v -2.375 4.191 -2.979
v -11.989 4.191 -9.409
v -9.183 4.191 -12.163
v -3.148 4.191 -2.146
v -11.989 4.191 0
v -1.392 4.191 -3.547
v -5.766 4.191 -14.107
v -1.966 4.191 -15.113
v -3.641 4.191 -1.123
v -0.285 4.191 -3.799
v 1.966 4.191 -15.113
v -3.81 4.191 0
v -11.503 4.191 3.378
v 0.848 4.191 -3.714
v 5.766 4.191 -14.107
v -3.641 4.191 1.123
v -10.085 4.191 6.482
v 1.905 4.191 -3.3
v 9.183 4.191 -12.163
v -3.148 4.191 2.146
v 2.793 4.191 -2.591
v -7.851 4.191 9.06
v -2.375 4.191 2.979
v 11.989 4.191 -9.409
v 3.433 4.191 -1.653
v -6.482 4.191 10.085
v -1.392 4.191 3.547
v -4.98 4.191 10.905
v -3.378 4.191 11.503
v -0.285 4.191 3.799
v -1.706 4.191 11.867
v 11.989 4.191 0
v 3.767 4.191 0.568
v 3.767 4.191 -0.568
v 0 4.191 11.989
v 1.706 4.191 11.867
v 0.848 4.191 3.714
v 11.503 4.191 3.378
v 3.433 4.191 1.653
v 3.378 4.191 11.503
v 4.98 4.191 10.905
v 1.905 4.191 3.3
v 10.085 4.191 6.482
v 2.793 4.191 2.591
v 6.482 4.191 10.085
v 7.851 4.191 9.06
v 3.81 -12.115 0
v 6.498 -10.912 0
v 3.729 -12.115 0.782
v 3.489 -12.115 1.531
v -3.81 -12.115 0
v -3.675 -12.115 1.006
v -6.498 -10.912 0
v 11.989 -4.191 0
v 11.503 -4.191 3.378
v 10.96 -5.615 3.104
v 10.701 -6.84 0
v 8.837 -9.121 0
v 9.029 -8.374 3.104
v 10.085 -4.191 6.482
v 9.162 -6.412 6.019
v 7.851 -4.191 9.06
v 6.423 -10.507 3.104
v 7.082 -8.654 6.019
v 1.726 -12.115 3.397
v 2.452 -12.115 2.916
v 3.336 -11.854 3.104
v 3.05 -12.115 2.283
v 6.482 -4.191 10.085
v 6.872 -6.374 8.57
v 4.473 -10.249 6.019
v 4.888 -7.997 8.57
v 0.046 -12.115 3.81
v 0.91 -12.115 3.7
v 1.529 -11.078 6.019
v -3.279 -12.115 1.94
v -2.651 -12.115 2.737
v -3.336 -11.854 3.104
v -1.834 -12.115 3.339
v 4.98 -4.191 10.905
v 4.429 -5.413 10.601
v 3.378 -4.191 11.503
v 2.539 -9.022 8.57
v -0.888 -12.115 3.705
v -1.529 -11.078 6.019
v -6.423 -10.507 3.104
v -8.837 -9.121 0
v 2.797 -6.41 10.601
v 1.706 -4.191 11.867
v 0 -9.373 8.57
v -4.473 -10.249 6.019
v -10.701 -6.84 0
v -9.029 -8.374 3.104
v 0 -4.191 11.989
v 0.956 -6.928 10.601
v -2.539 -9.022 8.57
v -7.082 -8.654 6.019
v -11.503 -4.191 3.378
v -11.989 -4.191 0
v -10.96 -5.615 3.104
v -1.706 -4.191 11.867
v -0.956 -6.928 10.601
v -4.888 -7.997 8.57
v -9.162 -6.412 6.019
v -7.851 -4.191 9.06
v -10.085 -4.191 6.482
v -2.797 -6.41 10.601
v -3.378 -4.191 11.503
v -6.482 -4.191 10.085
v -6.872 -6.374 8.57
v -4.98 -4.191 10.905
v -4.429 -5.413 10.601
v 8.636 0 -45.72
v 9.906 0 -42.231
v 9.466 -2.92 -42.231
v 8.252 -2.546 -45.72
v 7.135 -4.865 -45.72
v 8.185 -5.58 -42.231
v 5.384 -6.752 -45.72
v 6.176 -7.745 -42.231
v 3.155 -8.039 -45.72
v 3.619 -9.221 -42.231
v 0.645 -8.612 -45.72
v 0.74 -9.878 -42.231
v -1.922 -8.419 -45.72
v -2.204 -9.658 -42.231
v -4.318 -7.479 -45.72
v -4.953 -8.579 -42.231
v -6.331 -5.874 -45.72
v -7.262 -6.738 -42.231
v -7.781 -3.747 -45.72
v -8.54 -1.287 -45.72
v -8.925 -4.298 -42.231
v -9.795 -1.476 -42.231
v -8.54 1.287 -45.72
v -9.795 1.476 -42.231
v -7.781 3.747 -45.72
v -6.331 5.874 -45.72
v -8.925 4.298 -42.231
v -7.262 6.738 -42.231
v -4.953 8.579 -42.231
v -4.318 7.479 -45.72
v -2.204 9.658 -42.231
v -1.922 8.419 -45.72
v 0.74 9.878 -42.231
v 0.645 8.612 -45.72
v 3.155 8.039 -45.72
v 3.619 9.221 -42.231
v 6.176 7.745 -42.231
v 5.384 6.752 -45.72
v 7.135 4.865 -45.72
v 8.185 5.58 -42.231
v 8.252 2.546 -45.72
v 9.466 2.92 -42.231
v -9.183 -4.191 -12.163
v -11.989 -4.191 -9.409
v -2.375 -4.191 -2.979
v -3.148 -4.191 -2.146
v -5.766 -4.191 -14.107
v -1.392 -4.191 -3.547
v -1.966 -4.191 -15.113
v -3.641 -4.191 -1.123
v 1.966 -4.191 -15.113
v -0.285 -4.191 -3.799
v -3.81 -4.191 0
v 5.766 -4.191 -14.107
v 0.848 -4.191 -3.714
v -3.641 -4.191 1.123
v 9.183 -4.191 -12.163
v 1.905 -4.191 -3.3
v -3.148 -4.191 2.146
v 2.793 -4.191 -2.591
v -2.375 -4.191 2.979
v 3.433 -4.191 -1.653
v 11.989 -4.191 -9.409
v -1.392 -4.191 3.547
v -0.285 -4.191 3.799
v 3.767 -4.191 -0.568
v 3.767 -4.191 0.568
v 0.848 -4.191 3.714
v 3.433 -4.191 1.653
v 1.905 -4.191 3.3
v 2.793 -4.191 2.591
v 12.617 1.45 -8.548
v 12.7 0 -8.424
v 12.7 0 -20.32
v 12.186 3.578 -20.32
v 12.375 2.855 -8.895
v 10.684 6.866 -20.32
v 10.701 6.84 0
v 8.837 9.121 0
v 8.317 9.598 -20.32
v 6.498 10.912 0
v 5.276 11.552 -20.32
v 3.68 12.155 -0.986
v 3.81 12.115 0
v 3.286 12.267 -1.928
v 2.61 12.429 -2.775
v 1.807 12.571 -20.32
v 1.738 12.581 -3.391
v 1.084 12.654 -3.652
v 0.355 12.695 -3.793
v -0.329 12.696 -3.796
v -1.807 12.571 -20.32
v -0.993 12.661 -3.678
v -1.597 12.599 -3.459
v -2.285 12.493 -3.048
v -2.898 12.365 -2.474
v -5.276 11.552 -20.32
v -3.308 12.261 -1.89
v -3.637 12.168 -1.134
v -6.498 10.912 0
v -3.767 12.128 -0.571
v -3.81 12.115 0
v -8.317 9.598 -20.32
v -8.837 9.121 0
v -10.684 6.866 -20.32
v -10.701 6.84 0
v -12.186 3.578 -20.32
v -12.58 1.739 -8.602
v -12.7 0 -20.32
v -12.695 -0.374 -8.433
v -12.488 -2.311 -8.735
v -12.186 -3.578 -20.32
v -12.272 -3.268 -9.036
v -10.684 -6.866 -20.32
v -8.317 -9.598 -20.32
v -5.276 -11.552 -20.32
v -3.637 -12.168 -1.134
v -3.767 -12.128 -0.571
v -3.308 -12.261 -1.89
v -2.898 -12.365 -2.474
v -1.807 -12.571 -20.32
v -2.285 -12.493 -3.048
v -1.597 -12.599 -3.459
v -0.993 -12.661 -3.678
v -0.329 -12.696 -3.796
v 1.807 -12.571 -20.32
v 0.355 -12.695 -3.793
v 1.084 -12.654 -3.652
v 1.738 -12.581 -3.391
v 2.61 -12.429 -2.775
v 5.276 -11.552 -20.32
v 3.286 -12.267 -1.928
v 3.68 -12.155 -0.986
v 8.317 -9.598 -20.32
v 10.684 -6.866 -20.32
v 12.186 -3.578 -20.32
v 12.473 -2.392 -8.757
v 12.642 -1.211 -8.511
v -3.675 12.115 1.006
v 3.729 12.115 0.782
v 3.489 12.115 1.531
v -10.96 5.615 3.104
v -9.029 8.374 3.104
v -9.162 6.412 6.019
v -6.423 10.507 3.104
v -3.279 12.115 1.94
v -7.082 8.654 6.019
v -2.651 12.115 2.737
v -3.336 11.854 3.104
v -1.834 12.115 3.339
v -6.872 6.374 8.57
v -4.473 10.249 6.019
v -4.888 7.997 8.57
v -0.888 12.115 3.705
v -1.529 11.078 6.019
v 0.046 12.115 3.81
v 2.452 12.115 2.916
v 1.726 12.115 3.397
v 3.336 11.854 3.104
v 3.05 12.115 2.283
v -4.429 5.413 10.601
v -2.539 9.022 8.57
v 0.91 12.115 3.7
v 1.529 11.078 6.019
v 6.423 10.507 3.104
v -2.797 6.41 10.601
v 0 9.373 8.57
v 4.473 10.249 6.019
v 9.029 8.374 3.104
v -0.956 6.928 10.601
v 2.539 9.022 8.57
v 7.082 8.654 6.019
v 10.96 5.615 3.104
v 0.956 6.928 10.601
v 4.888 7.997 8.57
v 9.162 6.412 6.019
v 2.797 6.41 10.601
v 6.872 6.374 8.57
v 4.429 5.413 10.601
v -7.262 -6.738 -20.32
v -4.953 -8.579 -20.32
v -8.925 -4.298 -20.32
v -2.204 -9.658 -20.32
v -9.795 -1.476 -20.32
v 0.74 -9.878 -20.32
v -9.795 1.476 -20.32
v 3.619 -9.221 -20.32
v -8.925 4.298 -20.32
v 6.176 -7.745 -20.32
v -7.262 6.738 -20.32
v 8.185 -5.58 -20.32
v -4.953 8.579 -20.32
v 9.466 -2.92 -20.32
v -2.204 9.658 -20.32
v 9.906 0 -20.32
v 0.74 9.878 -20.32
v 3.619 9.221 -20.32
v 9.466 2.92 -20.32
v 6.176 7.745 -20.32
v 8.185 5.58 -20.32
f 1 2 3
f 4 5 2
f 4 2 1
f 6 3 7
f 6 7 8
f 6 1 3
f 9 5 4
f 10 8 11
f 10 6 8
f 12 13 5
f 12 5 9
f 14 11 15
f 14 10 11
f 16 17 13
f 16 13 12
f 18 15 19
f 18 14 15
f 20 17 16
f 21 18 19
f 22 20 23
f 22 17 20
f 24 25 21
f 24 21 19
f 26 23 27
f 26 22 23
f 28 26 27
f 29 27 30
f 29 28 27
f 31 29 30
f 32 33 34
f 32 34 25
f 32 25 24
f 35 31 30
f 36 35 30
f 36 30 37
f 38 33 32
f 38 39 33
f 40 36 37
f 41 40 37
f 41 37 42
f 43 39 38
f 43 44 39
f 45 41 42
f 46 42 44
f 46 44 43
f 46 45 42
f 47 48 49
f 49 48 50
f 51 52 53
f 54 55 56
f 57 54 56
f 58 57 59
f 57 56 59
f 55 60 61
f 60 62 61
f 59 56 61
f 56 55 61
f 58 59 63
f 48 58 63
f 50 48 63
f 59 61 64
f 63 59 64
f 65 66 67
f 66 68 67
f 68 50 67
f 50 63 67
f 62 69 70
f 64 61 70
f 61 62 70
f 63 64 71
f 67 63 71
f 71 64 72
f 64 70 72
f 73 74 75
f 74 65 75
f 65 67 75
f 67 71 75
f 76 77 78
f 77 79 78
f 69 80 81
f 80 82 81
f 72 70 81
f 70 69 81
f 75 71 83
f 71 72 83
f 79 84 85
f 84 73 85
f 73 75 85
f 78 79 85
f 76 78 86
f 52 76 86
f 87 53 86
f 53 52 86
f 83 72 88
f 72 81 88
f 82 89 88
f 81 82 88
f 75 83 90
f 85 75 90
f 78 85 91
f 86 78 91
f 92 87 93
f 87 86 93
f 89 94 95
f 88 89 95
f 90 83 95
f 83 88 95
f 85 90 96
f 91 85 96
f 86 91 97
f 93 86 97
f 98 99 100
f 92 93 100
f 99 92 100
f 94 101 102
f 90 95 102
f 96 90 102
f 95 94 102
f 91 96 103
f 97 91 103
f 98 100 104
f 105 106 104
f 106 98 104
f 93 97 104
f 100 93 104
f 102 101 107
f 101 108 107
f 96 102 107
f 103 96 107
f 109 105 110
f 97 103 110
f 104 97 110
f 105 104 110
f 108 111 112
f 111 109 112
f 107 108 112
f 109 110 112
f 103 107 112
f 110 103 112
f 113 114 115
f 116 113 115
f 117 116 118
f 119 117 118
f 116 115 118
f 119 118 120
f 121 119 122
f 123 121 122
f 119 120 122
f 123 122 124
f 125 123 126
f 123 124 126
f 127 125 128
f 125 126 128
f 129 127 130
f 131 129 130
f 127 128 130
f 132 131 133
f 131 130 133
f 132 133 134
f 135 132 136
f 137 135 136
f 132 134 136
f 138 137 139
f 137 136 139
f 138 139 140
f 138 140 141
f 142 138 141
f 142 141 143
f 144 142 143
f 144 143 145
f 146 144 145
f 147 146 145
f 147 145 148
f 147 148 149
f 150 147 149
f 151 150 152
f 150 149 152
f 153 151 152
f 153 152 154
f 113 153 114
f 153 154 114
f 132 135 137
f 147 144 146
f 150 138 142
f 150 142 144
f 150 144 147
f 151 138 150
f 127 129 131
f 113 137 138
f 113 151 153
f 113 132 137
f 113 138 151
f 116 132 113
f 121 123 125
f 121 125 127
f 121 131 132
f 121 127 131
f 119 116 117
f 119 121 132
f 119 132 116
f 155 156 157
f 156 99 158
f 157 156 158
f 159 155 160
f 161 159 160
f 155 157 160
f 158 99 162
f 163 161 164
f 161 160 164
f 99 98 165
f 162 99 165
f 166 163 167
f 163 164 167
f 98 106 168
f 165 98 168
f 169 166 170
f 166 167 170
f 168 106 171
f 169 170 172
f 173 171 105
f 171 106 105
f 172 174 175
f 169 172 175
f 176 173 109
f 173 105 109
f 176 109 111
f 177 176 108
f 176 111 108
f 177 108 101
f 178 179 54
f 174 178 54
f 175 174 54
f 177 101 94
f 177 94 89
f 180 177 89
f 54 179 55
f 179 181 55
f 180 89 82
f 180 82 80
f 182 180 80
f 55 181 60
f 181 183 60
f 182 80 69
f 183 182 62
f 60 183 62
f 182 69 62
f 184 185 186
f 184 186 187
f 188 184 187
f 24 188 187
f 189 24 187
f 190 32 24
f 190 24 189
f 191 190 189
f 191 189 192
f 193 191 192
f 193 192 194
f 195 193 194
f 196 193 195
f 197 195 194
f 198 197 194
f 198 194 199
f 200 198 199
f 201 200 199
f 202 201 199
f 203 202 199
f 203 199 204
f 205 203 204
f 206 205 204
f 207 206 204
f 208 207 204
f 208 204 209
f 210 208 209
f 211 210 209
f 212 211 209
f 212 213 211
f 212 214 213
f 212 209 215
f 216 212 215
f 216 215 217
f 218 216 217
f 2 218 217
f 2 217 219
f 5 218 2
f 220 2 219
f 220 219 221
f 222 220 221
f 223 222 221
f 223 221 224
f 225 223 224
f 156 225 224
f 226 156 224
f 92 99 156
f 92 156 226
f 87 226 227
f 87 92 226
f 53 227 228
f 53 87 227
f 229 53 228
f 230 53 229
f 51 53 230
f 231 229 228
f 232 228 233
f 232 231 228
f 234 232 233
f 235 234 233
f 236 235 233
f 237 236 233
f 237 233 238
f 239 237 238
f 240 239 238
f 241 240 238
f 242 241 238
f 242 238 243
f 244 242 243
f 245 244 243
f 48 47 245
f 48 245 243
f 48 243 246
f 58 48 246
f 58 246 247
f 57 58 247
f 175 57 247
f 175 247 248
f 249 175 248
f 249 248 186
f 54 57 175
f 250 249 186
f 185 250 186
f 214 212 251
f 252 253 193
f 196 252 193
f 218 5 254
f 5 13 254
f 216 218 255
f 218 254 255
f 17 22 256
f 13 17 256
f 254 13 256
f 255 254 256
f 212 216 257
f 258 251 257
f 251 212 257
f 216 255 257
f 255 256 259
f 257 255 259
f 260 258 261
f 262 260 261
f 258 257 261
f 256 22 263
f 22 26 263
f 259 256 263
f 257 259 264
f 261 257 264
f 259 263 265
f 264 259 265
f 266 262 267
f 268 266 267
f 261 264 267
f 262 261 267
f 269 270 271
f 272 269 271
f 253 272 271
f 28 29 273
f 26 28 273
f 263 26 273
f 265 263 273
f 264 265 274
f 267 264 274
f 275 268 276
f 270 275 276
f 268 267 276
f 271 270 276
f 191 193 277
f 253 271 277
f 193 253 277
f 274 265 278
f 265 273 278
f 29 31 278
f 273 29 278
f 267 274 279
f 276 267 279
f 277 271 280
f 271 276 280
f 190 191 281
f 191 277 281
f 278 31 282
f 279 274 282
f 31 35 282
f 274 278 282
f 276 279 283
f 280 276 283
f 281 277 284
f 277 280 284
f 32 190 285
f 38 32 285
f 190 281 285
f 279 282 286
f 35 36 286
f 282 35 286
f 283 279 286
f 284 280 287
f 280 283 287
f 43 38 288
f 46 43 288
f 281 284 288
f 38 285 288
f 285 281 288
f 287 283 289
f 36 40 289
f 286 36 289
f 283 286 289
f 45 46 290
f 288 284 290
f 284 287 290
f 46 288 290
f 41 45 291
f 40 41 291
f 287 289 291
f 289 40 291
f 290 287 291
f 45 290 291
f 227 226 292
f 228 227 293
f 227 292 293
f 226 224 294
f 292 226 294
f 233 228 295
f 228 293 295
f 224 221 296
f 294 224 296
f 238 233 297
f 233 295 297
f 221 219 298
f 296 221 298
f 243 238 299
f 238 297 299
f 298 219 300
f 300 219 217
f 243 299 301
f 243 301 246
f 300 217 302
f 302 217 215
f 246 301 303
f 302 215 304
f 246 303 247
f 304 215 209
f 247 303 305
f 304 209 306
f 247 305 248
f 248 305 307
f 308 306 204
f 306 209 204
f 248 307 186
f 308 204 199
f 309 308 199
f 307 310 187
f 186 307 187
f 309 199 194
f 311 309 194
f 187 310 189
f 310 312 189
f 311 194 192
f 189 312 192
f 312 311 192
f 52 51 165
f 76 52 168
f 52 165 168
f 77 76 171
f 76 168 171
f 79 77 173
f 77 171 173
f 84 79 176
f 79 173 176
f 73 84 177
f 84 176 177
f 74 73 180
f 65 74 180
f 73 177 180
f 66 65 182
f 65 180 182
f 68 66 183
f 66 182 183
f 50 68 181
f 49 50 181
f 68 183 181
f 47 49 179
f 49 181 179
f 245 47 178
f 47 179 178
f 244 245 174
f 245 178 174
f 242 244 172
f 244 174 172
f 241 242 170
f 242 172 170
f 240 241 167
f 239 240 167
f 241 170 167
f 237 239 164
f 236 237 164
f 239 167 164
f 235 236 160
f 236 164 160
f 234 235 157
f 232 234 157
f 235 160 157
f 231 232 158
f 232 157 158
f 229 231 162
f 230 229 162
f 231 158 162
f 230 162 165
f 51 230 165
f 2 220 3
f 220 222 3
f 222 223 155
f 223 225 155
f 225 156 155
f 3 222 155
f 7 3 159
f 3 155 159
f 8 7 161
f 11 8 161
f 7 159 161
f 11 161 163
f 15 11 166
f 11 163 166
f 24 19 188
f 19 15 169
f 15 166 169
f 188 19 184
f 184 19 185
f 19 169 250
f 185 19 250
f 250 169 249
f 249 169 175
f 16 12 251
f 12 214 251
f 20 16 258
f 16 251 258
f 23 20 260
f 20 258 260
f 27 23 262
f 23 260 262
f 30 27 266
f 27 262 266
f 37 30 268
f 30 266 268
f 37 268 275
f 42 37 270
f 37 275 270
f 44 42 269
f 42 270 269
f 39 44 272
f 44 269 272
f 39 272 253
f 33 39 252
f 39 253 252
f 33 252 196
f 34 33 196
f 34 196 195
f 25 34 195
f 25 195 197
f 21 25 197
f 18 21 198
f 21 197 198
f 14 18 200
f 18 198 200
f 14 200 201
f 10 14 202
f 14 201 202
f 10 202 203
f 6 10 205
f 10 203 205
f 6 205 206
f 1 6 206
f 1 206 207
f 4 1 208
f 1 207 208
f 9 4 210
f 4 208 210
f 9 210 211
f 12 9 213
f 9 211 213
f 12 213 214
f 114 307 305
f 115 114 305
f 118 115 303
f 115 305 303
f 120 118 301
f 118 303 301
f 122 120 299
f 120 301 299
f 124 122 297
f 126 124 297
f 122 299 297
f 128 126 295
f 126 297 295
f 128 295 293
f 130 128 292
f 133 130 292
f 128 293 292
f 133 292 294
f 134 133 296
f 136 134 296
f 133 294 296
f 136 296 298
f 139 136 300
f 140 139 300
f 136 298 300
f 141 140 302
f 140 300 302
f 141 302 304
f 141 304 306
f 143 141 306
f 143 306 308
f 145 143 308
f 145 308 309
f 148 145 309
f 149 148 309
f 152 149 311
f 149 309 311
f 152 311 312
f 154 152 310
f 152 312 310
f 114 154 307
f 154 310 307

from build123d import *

# Parameters (mm, degrees)
F0_R      = 12.7
F1_DEPTH  = 20.32
F2_R      = 15.24
F5_DEPTH  = 4.191
F6_R      = 3.81
F7_DEPTH  = 63.5
F8_R      = 9.906
F9_DEPTH  = 25.4
F10_SIZE2 = 3.4892963227
F10_SIZE  = 1.27


with BuildPart() as f1:
    # F0 (on Top) → F1 (new body)
    with BuildSketch(Plane.XY):
        Circle(F0_R)
    extrude(amount=-F1_DEPTH)

    # F3 (on Front) → F4 (revolve)
    with BuildSketch(Plane.XZ):
        with BuildLine():
            Line((0, 12.7), (0, 0))
            Line((0, 0), (12.7, 0))
            ThreePointArc((12.7, 0), (8.9802561211, 8.9802561211), (0, 12.7))
        make_face()
    revolve(axis=Axis((0, 0, 6.8661598489), (0, 0, -1)))

    # F2 (on Front) → F5 (cut, symmetric)
    with BuildSketch(Plane.XZ):
        Circle(F2_R)
    extrude(amount=F5_DEPTH, both=True, mode=Mode.SUBTRACT)

    # F6 (on face) → F7 (cut, symmetric)
    with BuildSketch(Plane(origin=(0, -4.191, 0), x_dir=(-1, 0, 0), z_dir=(0, 1, 0))):
        Circle(F6_R)
    extrude(amount=F7_DEPTH, both=True, mode=Mode.SUBTRACT)

    # F8 (on face) → F9 (join)
    with BuildSketch(Plane(origin=(0, 0, -20.32), x_dir=(1, 0, 0), z_dir=(0, 0, -1))):
        Circle(F8_R)
    extrude(amount=F9_DEPTH)

    # F10
    f10_edges = [f1.edges().sort_by_distance(p)[0] for p in [
        (-9.906, 0, -45.72),
    ]]
    f10_side = f1.faces().sort_by_distance((0, 0, -45.72))[0]
    chamfer(f10_edges, length=F10_SIZE, length2=F10_SIZE2, reference=f10_side)


solid = f1.part
